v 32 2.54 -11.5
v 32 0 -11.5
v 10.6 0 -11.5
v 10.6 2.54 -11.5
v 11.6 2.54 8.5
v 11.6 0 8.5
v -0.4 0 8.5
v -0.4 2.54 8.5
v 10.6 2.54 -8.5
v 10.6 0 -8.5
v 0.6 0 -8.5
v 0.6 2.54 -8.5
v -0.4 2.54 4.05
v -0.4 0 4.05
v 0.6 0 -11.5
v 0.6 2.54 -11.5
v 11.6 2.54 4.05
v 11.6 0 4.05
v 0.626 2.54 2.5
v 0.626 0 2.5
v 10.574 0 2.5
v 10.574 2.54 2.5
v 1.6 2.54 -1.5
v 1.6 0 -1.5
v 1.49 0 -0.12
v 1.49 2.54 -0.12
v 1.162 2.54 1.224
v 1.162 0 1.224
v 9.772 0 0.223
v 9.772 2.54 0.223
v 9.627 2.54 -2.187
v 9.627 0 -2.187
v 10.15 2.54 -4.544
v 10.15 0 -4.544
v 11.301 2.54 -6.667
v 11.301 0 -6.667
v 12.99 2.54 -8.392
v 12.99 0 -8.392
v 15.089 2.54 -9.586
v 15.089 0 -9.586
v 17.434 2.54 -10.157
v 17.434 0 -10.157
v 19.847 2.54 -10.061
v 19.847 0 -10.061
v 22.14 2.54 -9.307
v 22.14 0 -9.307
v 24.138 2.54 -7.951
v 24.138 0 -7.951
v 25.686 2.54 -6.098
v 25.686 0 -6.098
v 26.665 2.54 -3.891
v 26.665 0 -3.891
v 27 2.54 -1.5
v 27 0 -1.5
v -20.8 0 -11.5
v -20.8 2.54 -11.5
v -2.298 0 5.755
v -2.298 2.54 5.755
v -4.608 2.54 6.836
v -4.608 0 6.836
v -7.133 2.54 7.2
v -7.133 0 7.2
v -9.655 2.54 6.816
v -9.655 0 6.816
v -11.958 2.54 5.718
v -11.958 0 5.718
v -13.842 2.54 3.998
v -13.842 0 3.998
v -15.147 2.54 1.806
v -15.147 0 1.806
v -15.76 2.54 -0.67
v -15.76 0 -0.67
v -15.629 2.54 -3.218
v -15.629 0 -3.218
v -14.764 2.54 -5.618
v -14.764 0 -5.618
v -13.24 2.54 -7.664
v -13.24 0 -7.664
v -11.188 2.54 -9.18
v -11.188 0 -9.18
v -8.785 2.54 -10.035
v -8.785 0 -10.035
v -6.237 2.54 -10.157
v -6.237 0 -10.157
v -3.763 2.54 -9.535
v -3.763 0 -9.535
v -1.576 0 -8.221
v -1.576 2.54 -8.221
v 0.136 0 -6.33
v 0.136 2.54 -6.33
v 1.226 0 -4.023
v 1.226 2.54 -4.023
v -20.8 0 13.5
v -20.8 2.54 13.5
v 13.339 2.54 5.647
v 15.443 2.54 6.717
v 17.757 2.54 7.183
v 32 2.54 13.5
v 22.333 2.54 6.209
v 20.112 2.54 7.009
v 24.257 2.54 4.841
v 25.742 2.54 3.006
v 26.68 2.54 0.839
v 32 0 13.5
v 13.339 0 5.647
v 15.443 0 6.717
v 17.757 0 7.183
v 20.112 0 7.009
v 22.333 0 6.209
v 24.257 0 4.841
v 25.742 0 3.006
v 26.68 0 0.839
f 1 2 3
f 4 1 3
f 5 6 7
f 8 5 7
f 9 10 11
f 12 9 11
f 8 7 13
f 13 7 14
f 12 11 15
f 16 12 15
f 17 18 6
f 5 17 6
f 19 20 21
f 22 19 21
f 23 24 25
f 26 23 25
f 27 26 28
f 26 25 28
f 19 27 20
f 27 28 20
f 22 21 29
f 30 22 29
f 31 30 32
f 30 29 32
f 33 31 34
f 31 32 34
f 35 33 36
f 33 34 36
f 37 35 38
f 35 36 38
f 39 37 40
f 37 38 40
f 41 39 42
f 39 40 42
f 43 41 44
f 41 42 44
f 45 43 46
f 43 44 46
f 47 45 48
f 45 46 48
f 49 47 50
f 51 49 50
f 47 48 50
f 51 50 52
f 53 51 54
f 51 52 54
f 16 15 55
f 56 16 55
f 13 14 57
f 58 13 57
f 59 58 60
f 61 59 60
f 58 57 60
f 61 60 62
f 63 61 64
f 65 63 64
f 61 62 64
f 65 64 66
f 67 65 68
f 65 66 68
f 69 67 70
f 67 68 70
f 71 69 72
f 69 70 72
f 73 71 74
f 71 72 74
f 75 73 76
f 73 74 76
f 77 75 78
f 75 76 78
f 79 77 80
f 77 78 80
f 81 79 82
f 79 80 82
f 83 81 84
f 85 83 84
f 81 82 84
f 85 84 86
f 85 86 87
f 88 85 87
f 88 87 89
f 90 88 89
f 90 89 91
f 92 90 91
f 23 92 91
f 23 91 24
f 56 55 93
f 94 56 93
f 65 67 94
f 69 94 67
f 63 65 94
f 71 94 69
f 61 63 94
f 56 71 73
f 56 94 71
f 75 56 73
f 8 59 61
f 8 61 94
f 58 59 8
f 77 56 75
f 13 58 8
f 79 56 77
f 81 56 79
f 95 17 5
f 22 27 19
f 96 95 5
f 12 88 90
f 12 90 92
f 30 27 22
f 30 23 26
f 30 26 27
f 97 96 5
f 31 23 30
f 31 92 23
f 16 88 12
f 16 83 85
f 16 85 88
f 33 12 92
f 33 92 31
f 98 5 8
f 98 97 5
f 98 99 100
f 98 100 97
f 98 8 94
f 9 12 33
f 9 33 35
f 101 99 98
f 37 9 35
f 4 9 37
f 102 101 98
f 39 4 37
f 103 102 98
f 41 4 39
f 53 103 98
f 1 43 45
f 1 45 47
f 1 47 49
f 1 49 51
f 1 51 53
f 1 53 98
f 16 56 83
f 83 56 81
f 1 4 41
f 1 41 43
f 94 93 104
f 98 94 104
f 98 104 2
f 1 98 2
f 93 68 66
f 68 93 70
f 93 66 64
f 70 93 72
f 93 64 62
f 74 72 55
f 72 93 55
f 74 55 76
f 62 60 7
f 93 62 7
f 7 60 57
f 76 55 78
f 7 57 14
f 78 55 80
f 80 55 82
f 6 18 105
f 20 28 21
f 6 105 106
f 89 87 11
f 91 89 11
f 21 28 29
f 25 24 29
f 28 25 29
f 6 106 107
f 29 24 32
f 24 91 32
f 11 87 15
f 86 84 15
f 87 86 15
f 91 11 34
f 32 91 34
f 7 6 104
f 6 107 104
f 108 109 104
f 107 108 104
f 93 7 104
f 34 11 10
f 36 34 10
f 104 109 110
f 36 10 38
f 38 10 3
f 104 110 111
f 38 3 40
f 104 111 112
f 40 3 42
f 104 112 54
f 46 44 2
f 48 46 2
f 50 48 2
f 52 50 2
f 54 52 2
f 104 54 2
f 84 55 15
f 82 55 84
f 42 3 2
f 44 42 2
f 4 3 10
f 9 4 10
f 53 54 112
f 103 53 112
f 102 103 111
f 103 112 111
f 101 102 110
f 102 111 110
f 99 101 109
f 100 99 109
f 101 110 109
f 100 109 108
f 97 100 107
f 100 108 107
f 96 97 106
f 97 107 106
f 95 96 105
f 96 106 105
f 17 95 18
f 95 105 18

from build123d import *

# Parameters (mm, degrees)
BOSS_EXTRUDE1_DEPTH = 2.54


with BuildPart() as part:
    # Sketch1 → Boss-Extrude1 (new body)
    with BuildSketch(Plane(origin=(0, 0, 0), x_dir=(1, 0, 0), z_dir=(0, 1, 0))):
        Polygon((0.6, 11.5), (-20.8, 11.5), (-20.8, -13.5), (32, -13.5), (32, 11.5), (10.6, 11.5), (10.6, 8.5), (0.6, 8.5), align=None)
        with BuildLine():
            Line((11.6, -8.5), (-0.4, -8.5))
            Line((-0.4, -8.5), (-0.4, -4.04977477))
            ThreePointArc((-0.4, -4.04977477), (-15.284741902, 4.449576241), (1.6, 1.5))
            ThreePointArc((1.6, 1.5), (1.352975635, -0.558446724), (0.625930365, -2.5))
            Line((0.625930365, -2.5), (10.574069635, -2.5))
            ThreePointArc((10.574069635, -2.5), (16.241553276, 9.952975635), (27, 1.5))
            ThreePointArc((27, 1.5), (21.249576241, -6.684741902), (11.6, -4.04977477))
            Line((11.6, -4.04977477), (11.6, -8.5))
        make_face(mode=Mode.SUBTRACT)
    extrude(amount=BOSS_EXTRUDE1_DEPTH)


solid = part.part
